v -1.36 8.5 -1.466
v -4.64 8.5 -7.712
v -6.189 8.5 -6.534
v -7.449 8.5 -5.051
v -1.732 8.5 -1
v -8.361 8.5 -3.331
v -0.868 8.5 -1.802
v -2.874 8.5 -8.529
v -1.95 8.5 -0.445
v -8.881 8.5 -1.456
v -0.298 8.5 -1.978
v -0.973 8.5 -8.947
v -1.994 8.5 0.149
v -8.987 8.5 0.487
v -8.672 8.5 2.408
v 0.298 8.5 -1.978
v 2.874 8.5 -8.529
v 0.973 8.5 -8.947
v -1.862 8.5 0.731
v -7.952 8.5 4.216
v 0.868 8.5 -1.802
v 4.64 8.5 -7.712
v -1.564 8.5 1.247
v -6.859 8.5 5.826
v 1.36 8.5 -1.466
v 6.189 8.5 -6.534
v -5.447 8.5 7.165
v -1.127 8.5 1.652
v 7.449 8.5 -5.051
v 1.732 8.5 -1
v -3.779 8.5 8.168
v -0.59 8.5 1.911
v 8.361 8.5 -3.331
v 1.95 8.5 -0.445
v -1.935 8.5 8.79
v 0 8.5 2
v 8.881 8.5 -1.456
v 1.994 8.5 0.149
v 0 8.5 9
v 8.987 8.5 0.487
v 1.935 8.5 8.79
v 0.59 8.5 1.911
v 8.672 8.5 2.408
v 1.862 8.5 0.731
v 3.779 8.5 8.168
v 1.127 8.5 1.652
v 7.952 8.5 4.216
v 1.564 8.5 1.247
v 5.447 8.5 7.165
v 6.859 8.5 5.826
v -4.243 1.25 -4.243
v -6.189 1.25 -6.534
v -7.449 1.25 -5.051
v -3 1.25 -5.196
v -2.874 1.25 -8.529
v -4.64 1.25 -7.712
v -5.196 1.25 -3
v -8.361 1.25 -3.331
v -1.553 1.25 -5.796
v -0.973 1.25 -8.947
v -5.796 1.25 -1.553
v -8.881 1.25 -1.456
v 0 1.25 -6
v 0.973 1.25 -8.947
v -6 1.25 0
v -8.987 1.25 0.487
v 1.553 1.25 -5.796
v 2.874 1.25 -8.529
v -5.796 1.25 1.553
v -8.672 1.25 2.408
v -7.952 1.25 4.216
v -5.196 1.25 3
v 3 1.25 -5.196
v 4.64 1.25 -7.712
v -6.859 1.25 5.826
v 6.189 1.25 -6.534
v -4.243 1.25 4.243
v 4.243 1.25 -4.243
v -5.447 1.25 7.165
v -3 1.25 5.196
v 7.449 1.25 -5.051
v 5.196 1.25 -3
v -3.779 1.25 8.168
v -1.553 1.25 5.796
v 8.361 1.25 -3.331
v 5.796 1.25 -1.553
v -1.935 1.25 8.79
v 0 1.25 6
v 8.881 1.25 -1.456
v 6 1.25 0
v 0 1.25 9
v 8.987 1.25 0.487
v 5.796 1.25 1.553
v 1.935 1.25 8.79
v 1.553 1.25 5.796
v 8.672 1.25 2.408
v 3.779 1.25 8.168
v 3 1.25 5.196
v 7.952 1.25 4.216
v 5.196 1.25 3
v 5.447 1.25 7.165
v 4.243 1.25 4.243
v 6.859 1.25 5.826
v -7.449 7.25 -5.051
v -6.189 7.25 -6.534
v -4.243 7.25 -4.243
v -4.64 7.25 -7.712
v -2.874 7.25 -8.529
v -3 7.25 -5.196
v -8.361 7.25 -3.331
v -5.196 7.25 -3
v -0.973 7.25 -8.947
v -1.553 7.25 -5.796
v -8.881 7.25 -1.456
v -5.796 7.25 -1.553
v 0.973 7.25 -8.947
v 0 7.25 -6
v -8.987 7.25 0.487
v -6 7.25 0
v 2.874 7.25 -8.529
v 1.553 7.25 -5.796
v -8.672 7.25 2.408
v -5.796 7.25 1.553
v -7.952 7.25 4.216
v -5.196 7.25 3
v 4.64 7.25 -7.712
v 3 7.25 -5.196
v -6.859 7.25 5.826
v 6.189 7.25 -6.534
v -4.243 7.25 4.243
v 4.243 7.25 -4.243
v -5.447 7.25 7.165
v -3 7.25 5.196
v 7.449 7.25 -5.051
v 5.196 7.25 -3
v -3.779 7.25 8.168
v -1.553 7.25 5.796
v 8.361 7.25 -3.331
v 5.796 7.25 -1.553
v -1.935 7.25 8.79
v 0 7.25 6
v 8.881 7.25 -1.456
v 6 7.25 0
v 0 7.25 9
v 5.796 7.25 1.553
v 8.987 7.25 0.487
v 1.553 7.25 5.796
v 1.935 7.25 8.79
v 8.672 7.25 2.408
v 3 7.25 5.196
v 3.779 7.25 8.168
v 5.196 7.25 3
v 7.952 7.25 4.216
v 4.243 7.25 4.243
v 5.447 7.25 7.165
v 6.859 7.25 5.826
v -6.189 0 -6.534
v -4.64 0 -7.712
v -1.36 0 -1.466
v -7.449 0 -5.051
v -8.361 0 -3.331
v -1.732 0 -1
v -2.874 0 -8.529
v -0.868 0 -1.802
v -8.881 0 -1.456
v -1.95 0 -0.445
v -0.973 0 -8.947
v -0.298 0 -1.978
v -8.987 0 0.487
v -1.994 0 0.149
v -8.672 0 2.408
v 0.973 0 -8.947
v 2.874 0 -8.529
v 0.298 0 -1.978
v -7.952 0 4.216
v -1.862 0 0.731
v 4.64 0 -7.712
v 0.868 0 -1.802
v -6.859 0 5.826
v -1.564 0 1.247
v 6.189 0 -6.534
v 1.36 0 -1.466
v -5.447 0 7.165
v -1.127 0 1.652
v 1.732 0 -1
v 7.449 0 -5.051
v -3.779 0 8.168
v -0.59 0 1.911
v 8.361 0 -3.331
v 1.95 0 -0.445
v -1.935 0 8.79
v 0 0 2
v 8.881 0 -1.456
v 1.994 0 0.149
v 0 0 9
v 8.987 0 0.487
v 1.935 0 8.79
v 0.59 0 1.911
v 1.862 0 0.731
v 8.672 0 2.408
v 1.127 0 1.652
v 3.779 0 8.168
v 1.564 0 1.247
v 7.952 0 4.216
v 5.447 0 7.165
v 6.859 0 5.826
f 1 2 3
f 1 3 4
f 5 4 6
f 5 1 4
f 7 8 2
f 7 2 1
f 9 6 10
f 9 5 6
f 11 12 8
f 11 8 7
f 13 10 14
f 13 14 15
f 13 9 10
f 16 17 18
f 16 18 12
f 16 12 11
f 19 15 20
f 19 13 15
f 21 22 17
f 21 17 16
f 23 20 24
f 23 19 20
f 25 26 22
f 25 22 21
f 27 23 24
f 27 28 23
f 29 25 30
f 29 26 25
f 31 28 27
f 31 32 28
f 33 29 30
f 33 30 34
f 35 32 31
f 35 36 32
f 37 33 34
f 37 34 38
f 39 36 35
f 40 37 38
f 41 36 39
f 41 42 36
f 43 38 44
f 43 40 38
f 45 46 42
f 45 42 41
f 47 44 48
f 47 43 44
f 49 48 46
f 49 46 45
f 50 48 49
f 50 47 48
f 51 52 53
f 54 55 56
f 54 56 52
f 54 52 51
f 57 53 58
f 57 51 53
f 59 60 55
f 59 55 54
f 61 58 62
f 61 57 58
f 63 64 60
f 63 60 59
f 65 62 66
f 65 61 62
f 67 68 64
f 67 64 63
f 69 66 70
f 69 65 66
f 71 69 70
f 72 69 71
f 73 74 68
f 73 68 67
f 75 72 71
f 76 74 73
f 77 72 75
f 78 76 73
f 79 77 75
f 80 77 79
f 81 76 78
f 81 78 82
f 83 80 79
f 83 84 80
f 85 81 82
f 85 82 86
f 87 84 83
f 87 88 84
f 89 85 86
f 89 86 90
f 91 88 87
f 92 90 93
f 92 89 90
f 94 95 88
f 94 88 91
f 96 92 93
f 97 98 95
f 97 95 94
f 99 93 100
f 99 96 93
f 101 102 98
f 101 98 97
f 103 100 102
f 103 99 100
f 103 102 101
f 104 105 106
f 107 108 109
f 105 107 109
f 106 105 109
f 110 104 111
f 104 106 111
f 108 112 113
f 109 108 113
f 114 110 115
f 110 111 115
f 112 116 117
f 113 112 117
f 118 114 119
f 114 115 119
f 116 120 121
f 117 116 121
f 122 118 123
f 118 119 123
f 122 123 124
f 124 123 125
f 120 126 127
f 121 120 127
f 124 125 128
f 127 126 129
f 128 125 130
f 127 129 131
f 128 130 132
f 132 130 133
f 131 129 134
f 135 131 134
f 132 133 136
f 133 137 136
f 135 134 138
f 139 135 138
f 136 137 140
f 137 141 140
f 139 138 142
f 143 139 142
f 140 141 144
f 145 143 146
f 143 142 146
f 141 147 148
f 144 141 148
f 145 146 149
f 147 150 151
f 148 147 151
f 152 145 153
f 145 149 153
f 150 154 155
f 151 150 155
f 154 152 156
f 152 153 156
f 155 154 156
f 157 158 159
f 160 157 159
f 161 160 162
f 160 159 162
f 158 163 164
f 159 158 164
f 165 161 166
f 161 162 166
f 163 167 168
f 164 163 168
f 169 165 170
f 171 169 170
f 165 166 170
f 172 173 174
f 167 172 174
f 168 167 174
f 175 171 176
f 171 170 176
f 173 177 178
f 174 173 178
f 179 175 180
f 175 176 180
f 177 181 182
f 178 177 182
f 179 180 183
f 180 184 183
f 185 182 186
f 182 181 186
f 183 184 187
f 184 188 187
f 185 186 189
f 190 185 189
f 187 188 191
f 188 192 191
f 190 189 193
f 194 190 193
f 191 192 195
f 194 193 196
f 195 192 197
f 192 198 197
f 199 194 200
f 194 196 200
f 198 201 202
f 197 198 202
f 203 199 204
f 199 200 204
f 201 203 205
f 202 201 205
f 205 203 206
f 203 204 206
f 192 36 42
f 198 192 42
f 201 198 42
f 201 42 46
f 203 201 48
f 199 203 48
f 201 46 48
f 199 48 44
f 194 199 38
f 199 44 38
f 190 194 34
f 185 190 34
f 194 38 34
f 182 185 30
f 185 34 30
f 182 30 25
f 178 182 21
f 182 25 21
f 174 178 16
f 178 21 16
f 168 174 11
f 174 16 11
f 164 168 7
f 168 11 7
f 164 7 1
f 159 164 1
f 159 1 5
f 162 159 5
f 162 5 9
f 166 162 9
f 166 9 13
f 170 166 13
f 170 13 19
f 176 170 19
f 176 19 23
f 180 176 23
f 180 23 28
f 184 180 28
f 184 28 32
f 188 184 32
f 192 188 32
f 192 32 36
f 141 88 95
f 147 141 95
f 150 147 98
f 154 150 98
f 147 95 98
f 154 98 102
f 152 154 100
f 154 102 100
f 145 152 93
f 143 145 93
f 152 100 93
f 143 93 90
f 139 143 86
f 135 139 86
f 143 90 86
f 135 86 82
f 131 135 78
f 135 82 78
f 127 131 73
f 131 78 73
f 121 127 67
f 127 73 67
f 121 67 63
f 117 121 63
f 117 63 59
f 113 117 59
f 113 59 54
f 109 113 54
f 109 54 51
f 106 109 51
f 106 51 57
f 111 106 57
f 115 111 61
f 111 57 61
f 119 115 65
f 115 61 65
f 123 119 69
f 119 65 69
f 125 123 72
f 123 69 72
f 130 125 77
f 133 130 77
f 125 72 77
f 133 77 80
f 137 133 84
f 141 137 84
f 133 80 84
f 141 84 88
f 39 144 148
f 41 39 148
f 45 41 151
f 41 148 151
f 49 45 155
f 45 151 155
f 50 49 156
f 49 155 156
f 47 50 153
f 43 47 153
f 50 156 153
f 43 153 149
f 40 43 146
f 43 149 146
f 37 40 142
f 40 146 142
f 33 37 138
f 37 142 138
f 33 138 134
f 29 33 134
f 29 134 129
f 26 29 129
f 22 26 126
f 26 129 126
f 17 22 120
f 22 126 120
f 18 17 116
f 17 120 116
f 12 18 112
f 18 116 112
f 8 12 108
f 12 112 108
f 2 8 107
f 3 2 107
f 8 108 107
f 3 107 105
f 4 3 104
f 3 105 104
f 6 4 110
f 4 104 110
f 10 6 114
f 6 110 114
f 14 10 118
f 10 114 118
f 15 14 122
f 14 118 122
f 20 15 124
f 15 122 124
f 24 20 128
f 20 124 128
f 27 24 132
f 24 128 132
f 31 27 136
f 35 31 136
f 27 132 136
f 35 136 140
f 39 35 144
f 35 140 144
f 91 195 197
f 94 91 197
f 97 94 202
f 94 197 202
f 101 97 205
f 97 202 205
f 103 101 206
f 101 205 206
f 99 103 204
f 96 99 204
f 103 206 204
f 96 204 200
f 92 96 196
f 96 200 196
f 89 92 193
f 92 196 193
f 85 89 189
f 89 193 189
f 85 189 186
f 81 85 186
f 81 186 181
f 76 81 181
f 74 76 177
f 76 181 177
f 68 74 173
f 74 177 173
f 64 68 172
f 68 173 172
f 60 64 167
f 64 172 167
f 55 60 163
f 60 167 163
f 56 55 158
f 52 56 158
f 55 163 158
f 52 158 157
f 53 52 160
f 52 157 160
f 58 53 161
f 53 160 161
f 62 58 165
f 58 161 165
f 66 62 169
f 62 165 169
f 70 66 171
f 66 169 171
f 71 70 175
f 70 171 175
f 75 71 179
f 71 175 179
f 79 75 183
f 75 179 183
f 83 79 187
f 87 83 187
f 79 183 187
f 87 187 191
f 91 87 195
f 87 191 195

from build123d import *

# Parameters (mm, degrees)
SKETCH1_R           = 9
BOSS_EXTRUDE1_DEPTH = 1.25
SKETCH2_R           = 6
BOSS_EXTRUDE2_DEPTH = 6
SKETCH3_R           = 9
BOSS_EXTRUDE3_DEPTH = 1.25
SKETCH4_R           = 2
CUT_EXTRUDE1_DEPTH  = 10.25


with BuildPart() as part:
    # Sketch1 → Boss-Extrude1 (new body)
    with BuildSketch(Plane(origin=(0, 0, 0), x_dir=(1, 0, 0), z_dir=(0, 1, 0))):
        with Locations(Location((0, 0, 0), (0, 0, 270))):
            Circle(SKETCH1_R)
    extrude(amount=BOSS_EXTRUDE1_DEPTH)

    # Sketch2 → Boss-Extrude2 (add)
    with BuildSketch(Plane(origin=(0, 1.25, 0), x_dir=(1, 0, 0), z_dir=(0, 1, 0))):
        with Locations(Location((0, 0, 0), (0, 0, 270))):
            Circle(SKETCH2_R)
    extrude(amount=BOSS_EXTRUDE2_DEPTH)

    # Sketch3 → Boss-Extrude3 (add)
    with BuildSketch(Plane(origin=(0, 7.25, 0), x_dir=(1, 0, 0), z_dir=(0, 1, 0))):
        with Locations(Location((0, 0, 0), (0, 0, 270))):
            Circle(SKETCH3_R)
    extrude(amount=BOSS_EXTRUDE3_DEPTH)

    # Sketch4 → Cut-Extrude1 (cut)
    with BuildSketch(Plane(origin=(0, 8.5, 0), x_dir=(1, 0, 0), z_dir=(0, 1, 0))):
        with Locations(Location((0, 0, 0), (0, 0, 270))):
            Circle(SKETCH4_R)
    extrude(amount=-CUT_EXTRUDE1_DEPTH, mode=Mode.SUBTRACT)


solid = part.part
